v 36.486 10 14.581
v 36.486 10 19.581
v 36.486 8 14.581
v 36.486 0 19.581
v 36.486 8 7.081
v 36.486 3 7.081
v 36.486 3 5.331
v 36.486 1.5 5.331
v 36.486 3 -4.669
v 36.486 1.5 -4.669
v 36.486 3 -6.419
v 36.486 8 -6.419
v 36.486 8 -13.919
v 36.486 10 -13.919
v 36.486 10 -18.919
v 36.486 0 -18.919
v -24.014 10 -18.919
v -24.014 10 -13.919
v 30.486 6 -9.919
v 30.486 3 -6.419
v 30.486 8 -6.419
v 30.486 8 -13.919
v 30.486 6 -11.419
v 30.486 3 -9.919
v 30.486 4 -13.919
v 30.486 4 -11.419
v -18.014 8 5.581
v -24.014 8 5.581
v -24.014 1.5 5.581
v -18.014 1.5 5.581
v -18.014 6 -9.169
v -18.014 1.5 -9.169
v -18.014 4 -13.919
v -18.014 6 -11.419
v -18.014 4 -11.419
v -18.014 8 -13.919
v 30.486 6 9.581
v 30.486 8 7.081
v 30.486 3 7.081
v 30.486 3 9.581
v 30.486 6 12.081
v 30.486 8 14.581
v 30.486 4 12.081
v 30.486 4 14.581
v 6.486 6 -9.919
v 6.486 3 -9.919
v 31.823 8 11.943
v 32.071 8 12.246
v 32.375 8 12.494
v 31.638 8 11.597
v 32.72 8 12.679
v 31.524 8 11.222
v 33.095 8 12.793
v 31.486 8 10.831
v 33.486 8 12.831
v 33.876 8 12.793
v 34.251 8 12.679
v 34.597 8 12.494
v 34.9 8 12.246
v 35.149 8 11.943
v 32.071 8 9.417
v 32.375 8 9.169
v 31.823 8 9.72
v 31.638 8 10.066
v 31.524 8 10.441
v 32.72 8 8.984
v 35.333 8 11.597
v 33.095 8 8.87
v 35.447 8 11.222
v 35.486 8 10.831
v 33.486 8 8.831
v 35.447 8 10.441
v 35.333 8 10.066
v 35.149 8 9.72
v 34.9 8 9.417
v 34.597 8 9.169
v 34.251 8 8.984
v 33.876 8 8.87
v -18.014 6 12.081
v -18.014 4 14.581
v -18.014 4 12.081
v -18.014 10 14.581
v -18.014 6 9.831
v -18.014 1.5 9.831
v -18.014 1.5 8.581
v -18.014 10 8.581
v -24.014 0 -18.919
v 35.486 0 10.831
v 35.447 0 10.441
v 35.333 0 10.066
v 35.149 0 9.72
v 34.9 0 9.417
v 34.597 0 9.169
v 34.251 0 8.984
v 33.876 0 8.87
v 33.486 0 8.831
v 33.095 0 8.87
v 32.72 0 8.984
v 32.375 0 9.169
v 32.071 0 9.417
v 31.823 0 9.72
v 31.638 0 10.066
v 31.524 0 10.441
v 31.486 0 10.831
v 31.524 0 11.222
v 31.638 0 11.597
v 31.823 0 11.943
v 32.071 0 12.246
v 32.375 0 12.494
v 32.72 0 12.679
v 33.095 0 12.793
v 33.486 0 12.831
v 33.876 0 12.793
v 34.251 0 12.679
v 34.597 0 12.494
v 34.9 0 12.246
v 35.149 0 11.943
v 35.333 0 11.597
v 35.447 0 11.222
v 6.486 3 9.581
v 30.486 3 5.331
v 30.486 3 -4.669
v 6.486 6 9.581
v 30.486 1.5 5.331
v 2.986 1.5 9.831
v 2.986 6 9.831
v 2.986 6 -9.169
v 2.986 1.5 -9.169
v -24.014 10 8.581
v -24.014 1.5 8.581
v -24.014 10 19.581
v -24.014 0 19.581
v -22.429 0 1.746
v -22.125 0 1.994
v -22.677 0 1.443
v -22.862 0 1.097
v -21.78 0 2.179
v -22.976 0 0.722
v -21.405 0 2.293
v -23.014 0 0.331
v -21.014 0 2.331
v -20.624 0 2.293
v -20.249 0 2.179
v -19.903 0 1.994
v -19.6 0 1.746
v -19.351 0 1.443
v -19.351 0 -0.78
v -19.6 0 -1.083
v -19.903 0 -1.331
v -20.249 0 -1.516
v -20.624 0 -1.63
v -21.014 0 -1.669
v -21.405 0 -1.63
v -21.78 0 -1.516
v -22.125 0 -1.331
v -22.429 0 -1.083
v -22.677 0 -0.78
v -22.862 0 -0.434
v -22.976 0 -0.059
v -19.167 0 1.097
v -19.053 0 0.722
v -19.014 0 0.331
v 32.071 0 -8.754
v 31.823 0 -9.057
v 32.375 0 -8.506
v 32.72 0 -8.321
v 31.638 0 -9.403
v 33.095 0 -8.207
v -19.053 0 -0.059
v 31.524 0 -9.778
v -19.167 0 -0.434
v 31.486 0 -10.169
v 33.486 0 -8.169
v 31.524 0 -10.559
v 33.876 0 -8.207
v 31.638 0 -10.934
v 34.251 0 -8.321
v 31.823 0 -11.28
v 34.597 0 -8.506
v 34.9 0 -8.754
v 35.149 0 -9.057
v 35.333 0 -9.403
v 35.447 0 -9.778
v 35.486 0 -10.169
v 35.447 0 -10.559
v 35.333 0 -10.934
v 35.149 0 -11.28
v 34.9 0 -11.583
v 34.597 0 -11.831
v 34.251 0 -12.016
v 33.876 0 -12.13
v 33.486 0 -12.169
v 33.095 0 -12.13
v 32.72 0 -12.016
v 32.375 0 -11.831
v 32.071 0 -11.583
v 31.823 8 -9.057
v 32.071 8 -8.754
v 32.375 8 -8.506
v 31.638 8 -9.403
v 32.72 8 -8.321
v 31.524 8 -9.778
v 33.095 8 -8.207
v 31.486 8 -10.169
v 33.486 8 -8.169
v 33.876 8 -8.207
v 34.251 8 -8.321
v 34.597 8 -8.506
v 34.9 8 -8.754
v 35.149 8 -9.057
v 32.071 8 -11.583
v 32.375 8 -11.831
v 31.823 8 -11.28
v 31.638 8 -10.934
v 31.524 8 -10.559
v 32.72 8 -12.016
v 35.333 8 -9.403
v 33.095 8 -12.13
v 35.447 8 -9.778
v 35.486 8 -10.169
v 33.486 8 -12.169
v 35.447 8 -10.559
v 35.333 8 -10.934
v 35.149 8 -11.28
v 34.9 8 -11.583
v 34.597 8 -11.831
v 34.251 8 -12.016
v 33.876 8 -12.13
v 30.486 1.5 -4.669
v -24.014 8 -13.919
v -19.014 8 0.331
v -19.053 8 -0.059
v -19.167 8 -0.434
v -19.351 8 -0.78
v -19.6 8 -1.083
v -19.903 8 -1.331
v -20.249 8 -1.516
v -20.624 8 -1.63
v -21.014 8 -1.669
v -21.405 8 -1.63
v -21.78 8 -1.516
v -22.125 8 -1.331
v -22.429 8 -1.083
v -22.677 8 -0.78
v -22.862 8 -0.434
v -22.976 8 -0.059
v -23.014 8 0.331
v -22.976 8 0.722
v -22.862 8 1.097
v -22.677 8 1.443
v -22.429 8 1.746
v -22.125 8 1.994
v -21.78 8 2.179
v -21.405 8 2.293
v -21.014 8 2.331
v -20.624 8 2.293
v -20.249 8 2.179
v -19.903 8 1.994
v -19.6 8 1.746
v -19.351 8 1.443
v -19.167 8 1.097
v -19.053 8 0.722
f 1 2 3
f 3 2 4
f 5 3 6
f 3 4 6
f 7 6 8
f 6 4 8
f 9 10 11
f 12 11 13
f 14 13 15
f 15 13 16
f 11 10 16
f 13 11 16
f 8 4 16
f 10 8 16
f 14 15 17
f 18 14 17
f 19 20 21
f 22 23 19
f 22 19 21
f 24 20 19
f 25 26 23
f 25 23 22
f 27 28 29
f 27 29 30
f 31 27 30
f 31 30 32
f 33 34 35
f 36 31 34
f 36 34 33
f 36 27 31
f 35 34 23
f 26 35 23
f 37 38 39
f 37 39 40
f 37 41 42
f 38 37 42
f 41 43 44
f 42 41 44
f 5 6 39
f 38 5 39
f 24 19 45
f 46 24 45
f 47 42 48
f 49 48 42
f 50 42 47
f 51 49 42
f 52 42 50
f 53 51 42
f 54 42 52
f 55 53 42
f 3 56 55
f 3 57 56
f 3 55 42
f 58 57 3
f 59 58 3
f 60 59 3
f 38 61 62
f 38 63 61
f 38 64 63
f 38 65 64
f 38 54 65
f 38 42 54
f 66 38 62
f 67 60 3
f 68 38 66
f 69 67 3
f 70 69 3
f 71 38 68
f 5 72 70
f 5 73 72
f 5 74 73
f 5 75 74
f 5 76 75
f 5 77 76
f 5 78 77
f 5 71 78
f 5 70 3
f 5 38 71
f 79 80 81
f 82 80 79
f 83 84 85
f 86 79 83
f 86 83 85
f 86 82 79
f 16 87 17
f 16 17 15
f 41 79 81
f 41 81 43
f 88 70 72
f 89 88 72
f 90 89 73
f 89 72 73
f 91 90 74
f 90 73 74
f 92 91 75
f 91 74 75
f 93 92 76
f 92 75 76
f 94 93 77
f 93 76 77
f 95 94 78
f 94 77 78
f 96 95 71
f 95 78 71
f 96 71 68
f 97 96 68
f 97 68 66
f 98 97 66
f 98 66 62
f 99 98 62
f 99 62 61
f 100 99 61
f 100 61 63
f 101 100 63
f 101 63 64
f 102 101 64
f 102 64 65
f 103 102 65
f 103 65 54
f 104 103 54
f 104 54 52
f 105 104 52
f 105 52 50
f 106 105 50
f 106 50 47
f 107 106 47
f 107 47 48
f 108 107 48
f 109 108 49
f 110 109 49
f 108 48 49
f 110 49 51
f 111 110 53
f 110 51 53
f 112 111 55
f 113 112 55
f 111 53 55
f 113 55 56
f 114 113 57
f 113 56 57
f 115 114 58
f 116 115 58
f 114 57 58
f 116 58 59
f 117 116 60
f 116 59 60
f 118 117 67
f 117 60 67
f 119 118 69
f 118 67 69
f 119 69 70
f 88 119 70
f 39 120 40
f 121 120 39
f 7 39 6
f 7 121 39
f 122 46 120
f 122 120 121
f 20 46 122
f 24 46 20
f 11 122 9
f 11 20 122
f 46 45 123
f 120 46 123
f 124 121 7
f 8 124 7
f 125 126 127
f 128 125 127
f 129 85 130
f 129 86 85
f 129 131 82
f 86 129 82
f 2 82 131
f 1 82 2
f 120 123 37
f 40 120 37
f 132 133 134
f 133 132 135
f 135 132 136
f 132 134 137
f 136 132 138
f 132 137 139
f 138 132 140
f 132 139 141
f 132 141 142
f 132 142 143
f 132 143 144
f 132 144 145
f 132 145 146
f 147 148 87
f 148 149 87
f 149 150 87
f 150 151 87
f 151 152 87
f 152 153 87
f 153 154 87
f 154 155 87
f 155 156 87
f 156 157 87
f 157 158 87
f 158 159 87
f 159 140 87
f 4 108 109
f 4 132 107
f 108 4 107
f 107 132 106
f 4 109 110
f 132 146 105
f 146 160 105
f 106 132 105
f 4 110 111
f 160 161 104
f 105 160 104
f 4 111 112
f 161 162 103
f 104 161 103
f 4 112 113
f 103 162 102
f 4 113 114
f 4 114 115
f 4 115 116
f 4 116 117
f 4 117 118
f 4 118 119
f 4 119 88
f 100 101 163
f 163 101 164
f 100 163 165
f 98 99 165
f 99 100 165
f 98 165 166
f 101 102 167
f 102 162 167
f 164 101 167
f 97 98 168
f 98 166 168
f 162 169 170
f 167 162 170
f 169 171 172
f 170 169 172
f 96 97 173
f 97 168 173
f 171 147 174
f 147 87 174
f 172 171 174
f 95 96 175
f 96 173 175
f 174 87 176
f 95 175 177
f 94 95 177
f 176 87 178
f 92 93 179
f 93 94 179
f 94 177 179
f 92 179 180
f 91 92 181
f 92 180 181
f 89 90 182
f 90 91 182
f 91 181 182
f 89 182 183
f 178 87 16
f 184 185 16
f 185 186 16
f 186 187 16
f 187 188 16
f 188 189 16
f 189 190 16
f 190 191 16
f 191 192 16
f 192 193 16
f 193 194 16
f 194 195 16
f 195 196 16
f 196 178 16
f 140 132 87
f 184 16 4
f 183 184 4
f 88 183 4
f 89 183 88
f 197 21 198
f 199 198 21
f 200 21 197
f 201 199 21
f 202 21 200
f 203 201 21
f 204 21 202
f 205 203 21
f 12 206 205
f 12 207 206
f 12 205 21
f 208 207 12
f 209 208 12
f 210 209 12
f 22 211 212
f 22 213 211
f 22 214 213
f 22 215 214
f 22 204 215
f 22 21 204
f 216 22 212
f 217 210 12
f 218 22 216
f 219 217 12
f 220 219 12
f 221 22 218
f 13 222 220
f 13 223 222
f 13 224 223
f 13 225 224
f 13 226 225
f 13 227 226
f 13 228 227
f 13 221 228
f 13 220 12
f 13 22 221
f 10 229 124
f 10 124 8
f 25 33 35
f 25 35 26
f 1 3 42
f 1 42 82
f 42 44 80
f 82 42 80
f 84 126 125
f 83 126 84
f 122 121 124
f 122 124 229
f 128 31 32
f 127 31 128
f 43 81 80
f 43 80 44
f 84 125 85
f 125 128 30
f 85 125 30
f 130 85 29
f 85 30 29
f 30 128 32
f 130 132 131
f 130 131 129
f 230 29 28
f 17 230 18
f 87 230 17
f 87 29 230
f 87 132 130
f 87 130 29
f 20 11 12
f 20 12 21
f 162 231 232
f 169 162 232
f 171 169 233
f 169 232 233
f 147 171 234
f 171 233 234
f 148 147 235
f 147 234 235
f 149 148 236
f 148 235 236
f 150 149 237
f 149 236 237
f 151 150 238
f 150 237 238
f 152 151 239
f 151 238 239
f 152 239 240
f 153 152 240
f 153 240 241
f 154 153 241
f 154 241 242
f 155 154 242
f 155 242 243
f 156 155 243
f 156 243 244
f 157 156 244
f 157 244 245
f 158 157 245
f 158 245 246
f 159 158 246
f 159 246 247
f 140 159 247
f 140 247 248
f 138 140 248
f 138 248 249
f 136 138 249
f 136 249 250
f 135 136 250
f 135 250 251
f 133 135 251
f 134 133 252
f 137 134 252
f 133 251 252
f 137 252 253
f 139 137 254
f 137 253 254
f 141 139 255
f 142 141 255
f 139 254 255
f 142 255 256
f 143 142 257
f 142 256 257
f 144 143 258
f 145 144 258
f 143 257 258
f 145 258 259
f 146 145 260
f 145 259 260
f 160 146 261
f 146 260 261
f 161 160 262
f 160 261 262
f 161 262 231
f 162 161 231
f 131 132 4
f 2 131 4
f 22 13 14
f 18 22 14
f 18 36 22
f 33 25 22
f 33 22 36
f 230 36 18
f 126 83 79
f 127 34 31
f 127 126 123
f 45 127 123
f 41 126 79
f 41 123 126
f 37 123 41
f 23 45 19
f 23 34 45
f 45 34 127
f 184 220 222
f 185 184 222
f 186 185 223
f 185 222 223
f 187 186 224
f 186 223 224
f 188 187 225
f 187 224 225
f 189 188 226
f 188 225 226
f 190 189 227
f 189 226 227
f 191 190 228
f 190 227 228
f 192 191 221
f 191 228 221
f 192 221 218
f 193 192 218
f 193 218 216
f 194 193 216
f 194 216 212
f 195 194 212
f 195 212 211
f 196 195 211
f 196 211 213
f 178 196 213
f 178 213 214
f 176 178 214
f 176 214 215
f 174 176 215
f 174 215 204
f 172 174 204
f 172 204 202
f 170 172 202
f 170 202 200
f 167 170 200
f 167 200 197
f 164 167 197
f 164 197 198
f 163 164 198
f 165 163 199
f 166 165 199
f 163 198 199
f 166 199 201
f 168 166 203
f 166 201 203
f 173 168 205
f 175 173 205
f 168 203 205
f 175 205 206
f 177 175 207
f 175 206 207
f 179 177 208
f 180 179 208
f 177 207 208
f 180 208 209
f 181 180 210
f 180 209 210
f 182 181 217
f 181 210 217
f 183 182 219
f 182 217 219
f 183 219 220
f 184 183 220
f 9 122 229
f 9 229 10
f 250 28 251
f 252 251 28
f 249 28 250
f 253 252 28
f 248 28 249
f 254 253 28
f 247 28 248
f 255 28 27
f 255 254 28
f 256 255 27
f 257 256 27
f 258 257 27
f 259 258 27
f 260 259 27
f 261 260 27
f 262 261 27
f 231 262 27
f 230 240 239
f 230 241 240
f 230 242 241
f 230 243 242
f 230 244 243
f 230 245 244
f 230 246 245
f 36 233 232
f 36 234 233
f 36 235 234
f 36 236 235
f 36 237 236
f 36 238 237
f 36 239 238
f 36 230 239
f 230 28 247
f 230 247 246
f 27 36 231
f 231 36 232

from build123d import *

# Parameters (mm, degrees)
SKETCH1_W           = 60.5
SKETCH1_H           = 38.5
BOSS_EXTRUDE1_DEPTH = 6
BOSS_EXTRUDE2_DEPTH = 4
SKETCH4_W           = 6
SKETCH4_H           = 19.5
BOSS_EXTRUDE4_DEPTH = 2
SKETCH6_R           = 2
CUT_EXTRUDE1_DEPTH  = 9
SKETCH7_W           = 48.5
SKETCH7_H           = 2.5
CUT_EXTRUDE2_DEPTH  = 2
CUT_EXTRUDE3_DEPTH  = 4.5
CUT_EXTRUDE4_DEPTH  = 3
SKETCH10_W          = 6
SKETCH10_H          = 7.5
CUT_EXTRUDE5_DEPTH  = 2
SKETCH13_W          = 6
SKETCH13_H          = 10
CUT_EXTRUDE6_DEPTH  = 1.5
CUT_EXTRUDE7_REACH  = 10
SKETCH14_R          = 2


with BuildPart() as part:
    # Sketch1 → Boss-Extrude1 (new body)
    with BuildSketch(Plane(origin=(0, 0, 0), x_dir=(1, 0, 0), z_dir=(0, 1, 0))):
        with Locations((6.235680191, -0.331443914)):
            Rectangle(SKETCH1_W, SKETCH1_H)
    extrude(amount=BOSS_EXTRUDE1_DEPTH)

    # Sketch2 → Boss-Extrude2 (add)
    with BuildSketch(Plane(origin=(0, 6, 0), x_dir=(1, 0, 0), z_dir=(0, 1, 0))):
        Polygon((-24.014319809, -19.581443914), (36.485680191, -19.581443914), (36.485680191, -14.581443914), (36.485680191, -7.081443914), (30.485680191, -7.081443914), (30.485680191, -14.581443914), (-18.014319809, -14.581443914), (-18.014319809, -8.581443914), (-24.014319809, -8.581443914), (-24.014319809, -14.581443914), align=None)
        Polygon((-24.014319809, 18.918556086), (36.485680191, 18.918556086), (36.485680191, 13.918556086), (36.485680191, 6.418556086), (30.485680191, 6.418556086), (30.485680191, 13.918556086), (-24.014319809, 13.918556086), align=None)
    extrude(amount=BOSS_EXTRUDE2_DEPTH)

    # Sketch4 → Boss-Extrude4 (add)
    with BuildSketch(Plane(origin=(0, 6, 0), x_dir=(1, 0, 0), z_dir=(0, 1, 0))):
        with Locations((-21.014319809, 4.168556086)):
            Rectangle(SKETCH4_W, SKETCH4_H)
    extrude(amount=BOSS_EXTRUDE4_DEPTH)

    # Sketch6 → Cut-Extrude1 (cut, through all)
    with BuildSketch(Plane(origin=(0, 8, 0), x_dir=(1, 0, 0), z_dir=(0, 1, 0))):
        with Locations((-21.014319809, -0.331443914)):
            Circle(SKETCH6_R)
    extrude(amount=-CUT_EXTRUDE1_DEPTH, mode=Mode.SUBTRACT)

    # Sketch7 → Cut-Extrude2 (cut)
    with BuildSketch(Plane(origin=(0, 6, 0), x_dir=(1, 0, 0), z_dir=(0, 1, 0))):
        with Locations((6.235680191, 12.668556086)):
            Rectangle(SKETCH7_W, SKETCH7_H)
        with Locations((6.235680191, -13.331443914)):
            Rectangle(SKETCH7_W, SKETCH7_H)
    extrude(amount=-CUT_EXTRUDE2_DEPTH, mode=Mode.SUBTRACT)

    # Sketch8 → Cut-Extrude3 (cut)
    with BuildSketch(Plane(origin=(0, 6, 0), x_dir=(1, 0, 0), z_dir=(0, 1, 0))):
        Polygon((-18.014319809, -5.581443914), (-18.014319809, 9.168556086), (2.985680191, 9.168556086), (2.985680191, -8.581443914), (2.985680191, -9.831443914), (-18.014319809, -9.831443914), (-18.014319809, -8.581443914), (-24.014319809, -8.581443914), (-24.014319809, -5.581443914), align=None)
    extrude(amount=-CUT_EXTRUDE3_DEPTH, mode=Mode.SUBTRACT)

    # Sketch9 → Cut-Extrude4 (cut)
    with BuildSketch(Plane(origin=(0, 6, 0), x_dir=(1, 0, 0), z_dir=(0, 1, 0))):
        Polygon((30.485680191, 9.918556086), (6.485680191, 9.918556086), (6.485680191, -9.581443914), (30.485680191, -9.581443914), (30.485680191, -7.081443914), (36.485680191, -7.081443914), (36.485680191, 6.418556086), (30.485680191, 6.418556086), align=None)
    extrude(amount=-CUT_EXTRUDE4_DEPTH, mode=Mode.SUBTRACT)

    # Sketch10 → Cut-Extrude5 (cut)
    with BuildSketch(Plane(origin=(0, 10, 0), x_dir=(1, 0, 0), z_dir=(0, 1, 0))):
        with Locations((33.485680191, 10.168556086)):
            Rectangle(SKETCH10_W, SKETCH10_H)
        with Locations((33.485680191, -10.831443914)):
            Rectangle(SKETCH10_W, SKETCH10_H)
    extrude(amount=-CUT_EXTRUDE5_DEPTH, mode=Mode.SUBTRACT)

    # Sketch13 → Cut-Extrude6 (cut)
    with BuildSketch(Plane(origin=(0, 3, 0), x_dir=(1, 0, 0), z_dir=(0, 1, 0))):
        with Locations((33.485680191, -0.331443914)):
            Rectangle(SKETCH13_W, SKETCH13_H)
    extrude(amount=-CUT_EXTRUDE6_DEPTH, mode=Mode.SUBTRACT)

    # Sketch14 → Cut-Extrude7 (cut, up to next)
    with BuildSketch(Plane(origin=(0, 8, 0), x_dir=(1, 0, 0), z_dir=(0, 1, 0)), mode=Mode.PRIVATE) as cut_extrude7_sk1:
        with Locations((33.485680191, -10.831443914)):
            Circle(SKETCH14_R)
    cut_extrude7_tool1 = extrude(cut_extrude7_sk1.sketch, amount=-CUT_EXTRUDE7_REACH, mode=Mode.PRIVATE) & part.part
    add(cut_extrude7_tool1.solids().sort_by_distance((33.48568, 8, 10.831444))[0], mode=Mode.SUBTRACT)
    # Sketch14 → Cut-Extrude7 (cut, up to next)
    with BuildSketch(Plane(origin=(0, 8, 0), x_dir=(1, 0, 0), z_dir=(0, 1, 0)), mode=Mode.PRIVATE) as cut_extrude7_sk2:
        with Locations((33.485680191, 10.168556086)):
            Circle(SKETCH14_R)
    cut_extrude7_tool2 = extrude(cut_extrude7_sk2.sketch, amount=-CUT_EXTRUDE7_REACH, mode=Mode.PRIVATE) & part.part
    add(cut_extrude7_tool2.solids().sort_by_distance((33.48568, 8, -10.168556))[0], mode=Mode.SUBTRACT)


solid = part.part
